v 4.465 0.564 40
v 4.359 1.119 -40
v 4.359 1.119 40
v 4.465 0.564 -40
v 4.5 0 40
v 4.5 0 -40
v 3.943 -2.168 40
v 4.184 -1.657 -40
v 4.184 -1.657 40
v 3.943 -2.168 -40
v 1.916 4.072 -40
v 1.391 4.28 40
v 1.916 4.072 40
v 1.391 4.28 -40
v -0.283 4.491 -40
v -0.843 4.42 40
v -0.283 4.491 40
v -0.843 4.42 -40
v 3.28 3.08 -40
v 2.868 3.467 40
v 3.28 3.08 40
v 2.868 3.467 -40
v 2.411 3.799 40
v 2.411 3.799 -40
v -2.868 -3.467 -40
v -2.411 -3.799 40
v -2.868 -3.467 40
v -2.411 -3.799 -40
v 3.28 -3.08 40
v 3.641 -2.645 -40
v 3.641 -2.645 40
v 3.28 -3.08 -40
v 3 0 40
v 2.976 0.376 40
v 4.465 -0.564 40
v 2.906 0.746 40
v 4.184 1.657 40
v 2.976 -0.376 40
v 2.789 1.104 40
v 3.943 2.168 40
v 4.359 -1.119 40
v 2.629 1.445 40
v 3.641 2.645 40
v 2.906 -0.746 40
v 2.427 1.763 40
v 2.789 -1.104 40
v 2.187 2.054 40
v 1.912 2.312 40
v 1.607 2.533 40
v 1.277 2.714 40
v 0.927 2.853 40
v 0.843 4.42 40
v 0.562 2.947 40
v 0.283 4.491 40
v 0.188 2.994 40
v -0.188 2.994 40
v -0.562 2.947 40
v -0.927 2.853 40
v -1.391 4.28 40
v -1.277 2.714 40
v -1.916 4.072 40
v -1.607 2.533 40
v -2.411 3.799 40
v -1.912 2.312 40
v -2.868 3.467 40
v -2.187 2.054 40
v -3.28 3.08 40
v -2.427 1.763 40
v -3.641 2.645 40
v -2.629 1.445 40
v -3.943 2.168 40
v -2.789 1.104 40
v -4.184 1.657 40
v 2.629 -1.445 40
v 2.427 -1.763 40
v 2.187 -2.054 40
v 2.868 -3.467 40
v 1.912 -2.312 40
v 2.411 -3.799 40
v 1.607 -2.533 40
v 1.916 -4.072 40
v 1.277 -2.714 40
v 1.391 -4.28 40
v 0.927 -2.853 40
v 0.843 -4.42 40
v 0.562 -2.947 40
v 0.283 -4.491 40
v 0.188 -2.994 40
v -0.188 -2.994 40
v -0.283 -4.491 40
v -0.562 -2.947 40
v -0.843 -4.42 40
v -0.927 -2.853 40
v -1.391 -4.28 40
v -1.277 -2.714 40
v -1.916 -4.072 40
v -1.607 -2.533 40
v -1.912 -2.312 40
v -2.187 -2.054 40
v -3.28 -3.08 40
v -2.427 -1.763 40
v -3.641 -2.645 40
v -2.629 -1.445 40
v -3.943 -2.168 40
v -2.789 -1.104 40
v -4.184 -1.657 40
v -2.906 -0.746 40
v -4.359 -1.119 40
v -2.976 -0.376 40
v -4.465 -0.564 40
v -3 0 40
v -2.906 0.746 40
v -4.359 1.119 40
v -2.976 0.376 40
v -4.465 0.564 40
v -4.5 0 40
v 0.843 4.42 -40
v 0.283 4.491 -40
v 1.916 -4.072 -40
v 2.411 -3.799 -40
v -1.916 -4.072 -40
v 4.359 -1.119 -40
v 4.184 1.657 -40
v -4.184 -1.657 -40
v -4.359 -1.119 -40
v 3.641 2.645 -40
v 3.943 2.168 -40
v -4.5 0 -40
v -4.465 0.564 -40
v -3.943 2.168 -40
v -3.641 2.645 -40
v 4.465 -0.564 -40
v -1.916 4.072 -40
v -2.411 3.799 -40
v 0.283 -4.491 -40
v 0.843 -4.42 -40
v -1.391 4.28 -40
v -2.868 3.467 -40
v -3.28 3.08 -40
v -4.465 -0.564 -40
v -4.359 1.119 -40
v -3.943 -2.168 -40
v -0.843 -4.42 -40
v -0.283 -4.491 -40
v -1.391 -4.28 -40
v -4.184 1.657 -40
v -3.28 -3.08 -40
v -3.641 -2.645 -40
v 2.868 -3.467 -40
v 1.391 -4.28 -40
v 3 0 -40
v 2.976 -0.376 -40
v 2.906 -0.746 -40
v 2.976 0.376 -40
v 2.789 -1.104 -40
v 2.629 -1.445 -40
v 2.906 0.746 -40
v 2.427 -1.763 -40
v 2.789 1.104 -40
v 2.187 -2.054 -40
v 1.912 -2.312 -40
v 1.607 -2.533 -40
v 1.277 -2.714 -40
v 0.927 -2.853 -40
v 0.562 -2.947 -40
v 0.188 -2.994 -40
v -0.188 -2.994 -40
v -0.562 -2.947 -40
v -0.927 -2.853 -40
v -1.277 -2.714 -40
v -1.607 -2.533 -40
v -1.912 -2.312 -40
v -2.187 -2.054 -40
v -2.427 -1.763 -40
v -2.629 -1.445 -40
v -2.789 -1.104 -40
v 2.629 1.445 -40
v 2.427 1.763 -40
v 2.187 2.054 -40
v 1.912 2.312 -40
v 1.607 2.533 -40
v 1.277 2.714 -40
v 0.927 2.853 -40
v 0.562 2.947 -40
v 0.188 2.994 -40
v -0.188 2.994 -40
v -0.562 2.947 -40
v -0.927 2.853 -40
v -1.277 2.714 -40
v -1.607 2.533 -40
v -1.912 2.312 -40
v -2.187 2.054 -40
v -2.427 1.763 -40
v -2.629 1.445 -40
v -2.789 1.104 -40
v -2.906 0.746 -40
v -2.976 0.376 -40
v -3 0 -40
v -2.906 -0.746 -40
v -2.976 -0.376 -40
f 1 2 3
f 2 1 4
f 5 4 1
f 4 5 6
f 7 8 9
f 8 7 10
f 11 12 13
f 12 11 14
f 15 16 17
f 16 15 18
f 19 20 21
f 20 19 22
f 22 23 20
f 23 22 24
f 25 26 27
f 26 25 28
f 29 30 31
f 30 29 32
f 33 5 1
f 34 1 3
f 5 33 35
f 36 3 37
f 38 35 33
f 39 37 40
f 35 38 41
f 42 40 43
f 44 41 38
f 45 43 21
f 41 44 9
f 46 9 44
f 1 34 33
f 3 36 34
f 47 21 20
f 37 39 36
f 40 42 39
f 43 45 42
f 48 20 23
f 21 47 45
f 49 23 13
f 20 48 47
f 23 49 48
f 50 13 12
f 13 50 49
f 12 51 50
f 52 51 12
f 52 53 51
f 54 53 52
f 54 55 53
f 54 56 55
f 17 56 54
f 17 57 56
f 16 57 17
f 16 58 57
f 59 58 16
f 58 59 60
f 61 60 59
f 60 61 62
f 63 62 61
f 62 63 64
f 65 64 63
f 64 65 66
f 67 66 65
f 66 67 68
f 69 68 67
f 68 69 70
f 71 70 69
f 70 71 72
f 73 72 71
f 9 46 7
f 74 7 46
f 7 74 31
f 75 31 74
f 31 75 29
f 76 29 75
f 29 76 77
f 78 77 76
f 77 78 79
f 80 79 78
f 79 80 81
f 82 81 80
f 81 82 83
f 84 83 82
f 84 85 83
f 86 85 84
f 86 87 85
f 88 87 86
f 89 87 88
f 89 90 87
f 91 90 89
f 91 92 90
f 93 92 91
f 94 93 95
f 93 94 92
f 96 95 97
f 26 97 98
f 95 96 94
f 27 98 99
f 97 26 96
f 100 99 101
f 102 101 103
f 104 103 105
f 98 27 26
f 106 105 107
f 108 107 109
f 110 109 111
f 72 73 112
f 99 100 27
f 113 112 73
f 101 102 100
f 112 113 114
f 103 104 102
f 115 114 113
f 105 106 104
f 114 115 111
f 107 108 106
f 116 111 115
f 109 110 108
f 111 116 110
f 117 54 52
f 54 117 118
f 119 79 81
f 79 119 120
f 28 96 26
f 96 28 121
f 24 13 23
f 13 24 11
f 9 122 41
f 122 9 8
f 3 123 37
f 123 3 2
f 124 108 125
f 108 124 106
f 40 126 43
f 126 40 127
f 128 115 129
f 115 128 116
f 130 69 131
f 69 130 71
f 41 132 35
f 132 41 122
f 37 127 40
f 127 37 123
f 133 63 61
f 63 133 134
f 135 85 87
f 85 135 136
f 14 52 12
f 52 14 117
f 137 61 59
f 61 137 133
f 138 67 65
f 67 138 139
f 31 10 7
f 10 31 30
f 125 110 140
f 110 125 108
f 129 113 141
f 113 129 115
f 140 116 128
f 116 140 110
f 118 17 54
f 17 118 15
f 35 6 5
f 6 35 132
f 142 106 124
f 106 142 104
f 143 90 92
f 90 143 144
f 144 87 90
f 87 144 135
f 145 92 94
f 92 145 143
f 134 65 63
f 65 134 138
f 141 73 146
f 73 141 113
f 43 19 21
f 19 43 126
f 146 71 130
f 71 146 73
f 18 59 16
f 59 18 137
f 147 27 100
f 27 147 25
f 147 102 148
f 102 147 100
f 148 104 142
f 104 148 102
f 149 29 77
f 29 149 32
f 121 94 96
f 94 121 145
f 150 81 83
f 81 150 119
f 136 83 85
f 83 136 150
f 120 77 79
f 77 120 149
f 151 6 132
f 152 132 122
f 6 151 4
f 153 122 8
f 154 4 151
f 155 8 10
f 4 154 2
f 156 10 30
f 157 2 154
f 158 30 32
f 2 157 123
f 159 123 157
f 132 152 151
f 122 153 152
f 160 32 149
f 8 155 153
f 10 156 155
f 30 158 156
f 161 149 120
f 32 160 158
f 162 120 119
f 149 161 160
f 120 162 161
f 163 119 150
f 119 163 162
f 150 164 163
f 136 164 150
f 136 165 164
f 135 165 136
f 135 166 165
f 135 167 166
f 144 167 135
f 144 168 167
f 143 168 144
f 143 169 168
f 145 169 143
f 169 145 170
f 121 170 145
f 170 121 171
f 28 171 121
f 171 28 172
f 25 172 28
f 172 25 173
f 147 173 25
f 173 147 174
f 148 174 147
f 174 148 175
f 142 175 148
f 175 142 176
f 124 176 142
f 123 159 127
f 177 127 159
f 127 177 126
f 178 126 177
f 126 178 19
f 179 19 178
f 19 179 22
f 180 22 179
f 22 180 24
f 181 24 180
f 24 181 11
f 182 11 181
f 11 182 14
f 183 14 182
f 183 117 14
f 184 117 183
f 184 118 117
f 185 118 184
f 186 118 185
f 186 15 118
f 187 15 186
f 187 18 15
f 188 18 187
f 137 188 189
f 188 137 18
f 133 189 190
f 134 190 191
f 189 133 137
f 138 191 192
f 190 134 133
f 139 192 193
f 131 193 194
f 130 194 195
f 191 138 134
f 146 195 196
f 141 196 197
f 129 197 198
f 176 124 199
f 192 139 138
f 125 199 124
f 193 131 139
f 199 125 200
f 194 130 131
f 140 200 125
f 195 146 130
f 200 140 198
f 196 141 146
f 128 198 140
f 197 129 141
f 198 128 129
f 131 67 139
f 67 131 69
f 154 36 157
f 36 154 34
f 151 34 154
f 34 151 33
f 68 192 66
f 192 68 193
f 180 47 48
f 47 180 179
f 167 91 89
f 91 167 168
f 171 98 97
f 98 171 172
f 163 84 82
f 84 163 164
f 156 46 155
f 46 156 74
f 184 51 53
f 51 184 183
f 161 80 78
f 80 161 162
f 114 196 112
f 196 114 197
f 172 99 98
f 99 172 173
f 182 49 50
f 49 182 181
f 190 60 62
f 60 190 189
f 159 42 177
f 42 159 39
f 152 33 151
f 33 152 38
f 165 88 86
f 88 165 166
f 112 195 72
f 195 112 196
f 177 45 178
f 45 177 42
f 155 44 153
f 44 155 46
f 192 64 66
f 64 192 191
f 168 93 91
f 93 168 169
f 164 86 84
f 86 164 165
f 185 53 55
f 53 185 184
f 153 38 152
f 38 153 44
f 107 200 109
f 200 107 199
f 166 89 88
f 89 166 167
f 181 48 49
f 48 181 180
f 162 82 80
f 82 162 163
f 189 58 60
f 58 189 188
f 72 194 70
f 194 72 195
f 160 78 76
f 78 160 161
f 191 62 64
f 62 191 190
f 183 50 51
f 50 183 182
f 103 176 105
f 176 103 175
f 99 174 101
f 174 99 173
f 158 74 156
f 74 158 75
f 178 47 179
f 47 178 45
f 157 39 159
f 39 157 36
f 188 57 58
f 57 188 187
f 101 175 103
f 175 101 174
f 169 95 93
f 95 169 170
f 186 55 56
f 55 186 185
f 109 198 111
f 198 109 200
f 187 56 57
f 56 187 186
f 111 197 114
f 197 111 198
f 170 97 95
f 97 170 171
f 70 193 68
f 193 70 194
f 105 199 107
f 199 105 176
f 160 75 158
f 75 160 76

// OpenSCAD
$fn = 50;


difference() {
	union() {
		translate(v = [0, 0, -40.0000000000]) {
			cylinder(h = 80, r = 4.5000000000);
		}
	}
	union() {
		translate(v = [0, 0, -100.0000000000]) {
			cylinder(h = 200, r = 3.0000000000);
		}
	}
}
